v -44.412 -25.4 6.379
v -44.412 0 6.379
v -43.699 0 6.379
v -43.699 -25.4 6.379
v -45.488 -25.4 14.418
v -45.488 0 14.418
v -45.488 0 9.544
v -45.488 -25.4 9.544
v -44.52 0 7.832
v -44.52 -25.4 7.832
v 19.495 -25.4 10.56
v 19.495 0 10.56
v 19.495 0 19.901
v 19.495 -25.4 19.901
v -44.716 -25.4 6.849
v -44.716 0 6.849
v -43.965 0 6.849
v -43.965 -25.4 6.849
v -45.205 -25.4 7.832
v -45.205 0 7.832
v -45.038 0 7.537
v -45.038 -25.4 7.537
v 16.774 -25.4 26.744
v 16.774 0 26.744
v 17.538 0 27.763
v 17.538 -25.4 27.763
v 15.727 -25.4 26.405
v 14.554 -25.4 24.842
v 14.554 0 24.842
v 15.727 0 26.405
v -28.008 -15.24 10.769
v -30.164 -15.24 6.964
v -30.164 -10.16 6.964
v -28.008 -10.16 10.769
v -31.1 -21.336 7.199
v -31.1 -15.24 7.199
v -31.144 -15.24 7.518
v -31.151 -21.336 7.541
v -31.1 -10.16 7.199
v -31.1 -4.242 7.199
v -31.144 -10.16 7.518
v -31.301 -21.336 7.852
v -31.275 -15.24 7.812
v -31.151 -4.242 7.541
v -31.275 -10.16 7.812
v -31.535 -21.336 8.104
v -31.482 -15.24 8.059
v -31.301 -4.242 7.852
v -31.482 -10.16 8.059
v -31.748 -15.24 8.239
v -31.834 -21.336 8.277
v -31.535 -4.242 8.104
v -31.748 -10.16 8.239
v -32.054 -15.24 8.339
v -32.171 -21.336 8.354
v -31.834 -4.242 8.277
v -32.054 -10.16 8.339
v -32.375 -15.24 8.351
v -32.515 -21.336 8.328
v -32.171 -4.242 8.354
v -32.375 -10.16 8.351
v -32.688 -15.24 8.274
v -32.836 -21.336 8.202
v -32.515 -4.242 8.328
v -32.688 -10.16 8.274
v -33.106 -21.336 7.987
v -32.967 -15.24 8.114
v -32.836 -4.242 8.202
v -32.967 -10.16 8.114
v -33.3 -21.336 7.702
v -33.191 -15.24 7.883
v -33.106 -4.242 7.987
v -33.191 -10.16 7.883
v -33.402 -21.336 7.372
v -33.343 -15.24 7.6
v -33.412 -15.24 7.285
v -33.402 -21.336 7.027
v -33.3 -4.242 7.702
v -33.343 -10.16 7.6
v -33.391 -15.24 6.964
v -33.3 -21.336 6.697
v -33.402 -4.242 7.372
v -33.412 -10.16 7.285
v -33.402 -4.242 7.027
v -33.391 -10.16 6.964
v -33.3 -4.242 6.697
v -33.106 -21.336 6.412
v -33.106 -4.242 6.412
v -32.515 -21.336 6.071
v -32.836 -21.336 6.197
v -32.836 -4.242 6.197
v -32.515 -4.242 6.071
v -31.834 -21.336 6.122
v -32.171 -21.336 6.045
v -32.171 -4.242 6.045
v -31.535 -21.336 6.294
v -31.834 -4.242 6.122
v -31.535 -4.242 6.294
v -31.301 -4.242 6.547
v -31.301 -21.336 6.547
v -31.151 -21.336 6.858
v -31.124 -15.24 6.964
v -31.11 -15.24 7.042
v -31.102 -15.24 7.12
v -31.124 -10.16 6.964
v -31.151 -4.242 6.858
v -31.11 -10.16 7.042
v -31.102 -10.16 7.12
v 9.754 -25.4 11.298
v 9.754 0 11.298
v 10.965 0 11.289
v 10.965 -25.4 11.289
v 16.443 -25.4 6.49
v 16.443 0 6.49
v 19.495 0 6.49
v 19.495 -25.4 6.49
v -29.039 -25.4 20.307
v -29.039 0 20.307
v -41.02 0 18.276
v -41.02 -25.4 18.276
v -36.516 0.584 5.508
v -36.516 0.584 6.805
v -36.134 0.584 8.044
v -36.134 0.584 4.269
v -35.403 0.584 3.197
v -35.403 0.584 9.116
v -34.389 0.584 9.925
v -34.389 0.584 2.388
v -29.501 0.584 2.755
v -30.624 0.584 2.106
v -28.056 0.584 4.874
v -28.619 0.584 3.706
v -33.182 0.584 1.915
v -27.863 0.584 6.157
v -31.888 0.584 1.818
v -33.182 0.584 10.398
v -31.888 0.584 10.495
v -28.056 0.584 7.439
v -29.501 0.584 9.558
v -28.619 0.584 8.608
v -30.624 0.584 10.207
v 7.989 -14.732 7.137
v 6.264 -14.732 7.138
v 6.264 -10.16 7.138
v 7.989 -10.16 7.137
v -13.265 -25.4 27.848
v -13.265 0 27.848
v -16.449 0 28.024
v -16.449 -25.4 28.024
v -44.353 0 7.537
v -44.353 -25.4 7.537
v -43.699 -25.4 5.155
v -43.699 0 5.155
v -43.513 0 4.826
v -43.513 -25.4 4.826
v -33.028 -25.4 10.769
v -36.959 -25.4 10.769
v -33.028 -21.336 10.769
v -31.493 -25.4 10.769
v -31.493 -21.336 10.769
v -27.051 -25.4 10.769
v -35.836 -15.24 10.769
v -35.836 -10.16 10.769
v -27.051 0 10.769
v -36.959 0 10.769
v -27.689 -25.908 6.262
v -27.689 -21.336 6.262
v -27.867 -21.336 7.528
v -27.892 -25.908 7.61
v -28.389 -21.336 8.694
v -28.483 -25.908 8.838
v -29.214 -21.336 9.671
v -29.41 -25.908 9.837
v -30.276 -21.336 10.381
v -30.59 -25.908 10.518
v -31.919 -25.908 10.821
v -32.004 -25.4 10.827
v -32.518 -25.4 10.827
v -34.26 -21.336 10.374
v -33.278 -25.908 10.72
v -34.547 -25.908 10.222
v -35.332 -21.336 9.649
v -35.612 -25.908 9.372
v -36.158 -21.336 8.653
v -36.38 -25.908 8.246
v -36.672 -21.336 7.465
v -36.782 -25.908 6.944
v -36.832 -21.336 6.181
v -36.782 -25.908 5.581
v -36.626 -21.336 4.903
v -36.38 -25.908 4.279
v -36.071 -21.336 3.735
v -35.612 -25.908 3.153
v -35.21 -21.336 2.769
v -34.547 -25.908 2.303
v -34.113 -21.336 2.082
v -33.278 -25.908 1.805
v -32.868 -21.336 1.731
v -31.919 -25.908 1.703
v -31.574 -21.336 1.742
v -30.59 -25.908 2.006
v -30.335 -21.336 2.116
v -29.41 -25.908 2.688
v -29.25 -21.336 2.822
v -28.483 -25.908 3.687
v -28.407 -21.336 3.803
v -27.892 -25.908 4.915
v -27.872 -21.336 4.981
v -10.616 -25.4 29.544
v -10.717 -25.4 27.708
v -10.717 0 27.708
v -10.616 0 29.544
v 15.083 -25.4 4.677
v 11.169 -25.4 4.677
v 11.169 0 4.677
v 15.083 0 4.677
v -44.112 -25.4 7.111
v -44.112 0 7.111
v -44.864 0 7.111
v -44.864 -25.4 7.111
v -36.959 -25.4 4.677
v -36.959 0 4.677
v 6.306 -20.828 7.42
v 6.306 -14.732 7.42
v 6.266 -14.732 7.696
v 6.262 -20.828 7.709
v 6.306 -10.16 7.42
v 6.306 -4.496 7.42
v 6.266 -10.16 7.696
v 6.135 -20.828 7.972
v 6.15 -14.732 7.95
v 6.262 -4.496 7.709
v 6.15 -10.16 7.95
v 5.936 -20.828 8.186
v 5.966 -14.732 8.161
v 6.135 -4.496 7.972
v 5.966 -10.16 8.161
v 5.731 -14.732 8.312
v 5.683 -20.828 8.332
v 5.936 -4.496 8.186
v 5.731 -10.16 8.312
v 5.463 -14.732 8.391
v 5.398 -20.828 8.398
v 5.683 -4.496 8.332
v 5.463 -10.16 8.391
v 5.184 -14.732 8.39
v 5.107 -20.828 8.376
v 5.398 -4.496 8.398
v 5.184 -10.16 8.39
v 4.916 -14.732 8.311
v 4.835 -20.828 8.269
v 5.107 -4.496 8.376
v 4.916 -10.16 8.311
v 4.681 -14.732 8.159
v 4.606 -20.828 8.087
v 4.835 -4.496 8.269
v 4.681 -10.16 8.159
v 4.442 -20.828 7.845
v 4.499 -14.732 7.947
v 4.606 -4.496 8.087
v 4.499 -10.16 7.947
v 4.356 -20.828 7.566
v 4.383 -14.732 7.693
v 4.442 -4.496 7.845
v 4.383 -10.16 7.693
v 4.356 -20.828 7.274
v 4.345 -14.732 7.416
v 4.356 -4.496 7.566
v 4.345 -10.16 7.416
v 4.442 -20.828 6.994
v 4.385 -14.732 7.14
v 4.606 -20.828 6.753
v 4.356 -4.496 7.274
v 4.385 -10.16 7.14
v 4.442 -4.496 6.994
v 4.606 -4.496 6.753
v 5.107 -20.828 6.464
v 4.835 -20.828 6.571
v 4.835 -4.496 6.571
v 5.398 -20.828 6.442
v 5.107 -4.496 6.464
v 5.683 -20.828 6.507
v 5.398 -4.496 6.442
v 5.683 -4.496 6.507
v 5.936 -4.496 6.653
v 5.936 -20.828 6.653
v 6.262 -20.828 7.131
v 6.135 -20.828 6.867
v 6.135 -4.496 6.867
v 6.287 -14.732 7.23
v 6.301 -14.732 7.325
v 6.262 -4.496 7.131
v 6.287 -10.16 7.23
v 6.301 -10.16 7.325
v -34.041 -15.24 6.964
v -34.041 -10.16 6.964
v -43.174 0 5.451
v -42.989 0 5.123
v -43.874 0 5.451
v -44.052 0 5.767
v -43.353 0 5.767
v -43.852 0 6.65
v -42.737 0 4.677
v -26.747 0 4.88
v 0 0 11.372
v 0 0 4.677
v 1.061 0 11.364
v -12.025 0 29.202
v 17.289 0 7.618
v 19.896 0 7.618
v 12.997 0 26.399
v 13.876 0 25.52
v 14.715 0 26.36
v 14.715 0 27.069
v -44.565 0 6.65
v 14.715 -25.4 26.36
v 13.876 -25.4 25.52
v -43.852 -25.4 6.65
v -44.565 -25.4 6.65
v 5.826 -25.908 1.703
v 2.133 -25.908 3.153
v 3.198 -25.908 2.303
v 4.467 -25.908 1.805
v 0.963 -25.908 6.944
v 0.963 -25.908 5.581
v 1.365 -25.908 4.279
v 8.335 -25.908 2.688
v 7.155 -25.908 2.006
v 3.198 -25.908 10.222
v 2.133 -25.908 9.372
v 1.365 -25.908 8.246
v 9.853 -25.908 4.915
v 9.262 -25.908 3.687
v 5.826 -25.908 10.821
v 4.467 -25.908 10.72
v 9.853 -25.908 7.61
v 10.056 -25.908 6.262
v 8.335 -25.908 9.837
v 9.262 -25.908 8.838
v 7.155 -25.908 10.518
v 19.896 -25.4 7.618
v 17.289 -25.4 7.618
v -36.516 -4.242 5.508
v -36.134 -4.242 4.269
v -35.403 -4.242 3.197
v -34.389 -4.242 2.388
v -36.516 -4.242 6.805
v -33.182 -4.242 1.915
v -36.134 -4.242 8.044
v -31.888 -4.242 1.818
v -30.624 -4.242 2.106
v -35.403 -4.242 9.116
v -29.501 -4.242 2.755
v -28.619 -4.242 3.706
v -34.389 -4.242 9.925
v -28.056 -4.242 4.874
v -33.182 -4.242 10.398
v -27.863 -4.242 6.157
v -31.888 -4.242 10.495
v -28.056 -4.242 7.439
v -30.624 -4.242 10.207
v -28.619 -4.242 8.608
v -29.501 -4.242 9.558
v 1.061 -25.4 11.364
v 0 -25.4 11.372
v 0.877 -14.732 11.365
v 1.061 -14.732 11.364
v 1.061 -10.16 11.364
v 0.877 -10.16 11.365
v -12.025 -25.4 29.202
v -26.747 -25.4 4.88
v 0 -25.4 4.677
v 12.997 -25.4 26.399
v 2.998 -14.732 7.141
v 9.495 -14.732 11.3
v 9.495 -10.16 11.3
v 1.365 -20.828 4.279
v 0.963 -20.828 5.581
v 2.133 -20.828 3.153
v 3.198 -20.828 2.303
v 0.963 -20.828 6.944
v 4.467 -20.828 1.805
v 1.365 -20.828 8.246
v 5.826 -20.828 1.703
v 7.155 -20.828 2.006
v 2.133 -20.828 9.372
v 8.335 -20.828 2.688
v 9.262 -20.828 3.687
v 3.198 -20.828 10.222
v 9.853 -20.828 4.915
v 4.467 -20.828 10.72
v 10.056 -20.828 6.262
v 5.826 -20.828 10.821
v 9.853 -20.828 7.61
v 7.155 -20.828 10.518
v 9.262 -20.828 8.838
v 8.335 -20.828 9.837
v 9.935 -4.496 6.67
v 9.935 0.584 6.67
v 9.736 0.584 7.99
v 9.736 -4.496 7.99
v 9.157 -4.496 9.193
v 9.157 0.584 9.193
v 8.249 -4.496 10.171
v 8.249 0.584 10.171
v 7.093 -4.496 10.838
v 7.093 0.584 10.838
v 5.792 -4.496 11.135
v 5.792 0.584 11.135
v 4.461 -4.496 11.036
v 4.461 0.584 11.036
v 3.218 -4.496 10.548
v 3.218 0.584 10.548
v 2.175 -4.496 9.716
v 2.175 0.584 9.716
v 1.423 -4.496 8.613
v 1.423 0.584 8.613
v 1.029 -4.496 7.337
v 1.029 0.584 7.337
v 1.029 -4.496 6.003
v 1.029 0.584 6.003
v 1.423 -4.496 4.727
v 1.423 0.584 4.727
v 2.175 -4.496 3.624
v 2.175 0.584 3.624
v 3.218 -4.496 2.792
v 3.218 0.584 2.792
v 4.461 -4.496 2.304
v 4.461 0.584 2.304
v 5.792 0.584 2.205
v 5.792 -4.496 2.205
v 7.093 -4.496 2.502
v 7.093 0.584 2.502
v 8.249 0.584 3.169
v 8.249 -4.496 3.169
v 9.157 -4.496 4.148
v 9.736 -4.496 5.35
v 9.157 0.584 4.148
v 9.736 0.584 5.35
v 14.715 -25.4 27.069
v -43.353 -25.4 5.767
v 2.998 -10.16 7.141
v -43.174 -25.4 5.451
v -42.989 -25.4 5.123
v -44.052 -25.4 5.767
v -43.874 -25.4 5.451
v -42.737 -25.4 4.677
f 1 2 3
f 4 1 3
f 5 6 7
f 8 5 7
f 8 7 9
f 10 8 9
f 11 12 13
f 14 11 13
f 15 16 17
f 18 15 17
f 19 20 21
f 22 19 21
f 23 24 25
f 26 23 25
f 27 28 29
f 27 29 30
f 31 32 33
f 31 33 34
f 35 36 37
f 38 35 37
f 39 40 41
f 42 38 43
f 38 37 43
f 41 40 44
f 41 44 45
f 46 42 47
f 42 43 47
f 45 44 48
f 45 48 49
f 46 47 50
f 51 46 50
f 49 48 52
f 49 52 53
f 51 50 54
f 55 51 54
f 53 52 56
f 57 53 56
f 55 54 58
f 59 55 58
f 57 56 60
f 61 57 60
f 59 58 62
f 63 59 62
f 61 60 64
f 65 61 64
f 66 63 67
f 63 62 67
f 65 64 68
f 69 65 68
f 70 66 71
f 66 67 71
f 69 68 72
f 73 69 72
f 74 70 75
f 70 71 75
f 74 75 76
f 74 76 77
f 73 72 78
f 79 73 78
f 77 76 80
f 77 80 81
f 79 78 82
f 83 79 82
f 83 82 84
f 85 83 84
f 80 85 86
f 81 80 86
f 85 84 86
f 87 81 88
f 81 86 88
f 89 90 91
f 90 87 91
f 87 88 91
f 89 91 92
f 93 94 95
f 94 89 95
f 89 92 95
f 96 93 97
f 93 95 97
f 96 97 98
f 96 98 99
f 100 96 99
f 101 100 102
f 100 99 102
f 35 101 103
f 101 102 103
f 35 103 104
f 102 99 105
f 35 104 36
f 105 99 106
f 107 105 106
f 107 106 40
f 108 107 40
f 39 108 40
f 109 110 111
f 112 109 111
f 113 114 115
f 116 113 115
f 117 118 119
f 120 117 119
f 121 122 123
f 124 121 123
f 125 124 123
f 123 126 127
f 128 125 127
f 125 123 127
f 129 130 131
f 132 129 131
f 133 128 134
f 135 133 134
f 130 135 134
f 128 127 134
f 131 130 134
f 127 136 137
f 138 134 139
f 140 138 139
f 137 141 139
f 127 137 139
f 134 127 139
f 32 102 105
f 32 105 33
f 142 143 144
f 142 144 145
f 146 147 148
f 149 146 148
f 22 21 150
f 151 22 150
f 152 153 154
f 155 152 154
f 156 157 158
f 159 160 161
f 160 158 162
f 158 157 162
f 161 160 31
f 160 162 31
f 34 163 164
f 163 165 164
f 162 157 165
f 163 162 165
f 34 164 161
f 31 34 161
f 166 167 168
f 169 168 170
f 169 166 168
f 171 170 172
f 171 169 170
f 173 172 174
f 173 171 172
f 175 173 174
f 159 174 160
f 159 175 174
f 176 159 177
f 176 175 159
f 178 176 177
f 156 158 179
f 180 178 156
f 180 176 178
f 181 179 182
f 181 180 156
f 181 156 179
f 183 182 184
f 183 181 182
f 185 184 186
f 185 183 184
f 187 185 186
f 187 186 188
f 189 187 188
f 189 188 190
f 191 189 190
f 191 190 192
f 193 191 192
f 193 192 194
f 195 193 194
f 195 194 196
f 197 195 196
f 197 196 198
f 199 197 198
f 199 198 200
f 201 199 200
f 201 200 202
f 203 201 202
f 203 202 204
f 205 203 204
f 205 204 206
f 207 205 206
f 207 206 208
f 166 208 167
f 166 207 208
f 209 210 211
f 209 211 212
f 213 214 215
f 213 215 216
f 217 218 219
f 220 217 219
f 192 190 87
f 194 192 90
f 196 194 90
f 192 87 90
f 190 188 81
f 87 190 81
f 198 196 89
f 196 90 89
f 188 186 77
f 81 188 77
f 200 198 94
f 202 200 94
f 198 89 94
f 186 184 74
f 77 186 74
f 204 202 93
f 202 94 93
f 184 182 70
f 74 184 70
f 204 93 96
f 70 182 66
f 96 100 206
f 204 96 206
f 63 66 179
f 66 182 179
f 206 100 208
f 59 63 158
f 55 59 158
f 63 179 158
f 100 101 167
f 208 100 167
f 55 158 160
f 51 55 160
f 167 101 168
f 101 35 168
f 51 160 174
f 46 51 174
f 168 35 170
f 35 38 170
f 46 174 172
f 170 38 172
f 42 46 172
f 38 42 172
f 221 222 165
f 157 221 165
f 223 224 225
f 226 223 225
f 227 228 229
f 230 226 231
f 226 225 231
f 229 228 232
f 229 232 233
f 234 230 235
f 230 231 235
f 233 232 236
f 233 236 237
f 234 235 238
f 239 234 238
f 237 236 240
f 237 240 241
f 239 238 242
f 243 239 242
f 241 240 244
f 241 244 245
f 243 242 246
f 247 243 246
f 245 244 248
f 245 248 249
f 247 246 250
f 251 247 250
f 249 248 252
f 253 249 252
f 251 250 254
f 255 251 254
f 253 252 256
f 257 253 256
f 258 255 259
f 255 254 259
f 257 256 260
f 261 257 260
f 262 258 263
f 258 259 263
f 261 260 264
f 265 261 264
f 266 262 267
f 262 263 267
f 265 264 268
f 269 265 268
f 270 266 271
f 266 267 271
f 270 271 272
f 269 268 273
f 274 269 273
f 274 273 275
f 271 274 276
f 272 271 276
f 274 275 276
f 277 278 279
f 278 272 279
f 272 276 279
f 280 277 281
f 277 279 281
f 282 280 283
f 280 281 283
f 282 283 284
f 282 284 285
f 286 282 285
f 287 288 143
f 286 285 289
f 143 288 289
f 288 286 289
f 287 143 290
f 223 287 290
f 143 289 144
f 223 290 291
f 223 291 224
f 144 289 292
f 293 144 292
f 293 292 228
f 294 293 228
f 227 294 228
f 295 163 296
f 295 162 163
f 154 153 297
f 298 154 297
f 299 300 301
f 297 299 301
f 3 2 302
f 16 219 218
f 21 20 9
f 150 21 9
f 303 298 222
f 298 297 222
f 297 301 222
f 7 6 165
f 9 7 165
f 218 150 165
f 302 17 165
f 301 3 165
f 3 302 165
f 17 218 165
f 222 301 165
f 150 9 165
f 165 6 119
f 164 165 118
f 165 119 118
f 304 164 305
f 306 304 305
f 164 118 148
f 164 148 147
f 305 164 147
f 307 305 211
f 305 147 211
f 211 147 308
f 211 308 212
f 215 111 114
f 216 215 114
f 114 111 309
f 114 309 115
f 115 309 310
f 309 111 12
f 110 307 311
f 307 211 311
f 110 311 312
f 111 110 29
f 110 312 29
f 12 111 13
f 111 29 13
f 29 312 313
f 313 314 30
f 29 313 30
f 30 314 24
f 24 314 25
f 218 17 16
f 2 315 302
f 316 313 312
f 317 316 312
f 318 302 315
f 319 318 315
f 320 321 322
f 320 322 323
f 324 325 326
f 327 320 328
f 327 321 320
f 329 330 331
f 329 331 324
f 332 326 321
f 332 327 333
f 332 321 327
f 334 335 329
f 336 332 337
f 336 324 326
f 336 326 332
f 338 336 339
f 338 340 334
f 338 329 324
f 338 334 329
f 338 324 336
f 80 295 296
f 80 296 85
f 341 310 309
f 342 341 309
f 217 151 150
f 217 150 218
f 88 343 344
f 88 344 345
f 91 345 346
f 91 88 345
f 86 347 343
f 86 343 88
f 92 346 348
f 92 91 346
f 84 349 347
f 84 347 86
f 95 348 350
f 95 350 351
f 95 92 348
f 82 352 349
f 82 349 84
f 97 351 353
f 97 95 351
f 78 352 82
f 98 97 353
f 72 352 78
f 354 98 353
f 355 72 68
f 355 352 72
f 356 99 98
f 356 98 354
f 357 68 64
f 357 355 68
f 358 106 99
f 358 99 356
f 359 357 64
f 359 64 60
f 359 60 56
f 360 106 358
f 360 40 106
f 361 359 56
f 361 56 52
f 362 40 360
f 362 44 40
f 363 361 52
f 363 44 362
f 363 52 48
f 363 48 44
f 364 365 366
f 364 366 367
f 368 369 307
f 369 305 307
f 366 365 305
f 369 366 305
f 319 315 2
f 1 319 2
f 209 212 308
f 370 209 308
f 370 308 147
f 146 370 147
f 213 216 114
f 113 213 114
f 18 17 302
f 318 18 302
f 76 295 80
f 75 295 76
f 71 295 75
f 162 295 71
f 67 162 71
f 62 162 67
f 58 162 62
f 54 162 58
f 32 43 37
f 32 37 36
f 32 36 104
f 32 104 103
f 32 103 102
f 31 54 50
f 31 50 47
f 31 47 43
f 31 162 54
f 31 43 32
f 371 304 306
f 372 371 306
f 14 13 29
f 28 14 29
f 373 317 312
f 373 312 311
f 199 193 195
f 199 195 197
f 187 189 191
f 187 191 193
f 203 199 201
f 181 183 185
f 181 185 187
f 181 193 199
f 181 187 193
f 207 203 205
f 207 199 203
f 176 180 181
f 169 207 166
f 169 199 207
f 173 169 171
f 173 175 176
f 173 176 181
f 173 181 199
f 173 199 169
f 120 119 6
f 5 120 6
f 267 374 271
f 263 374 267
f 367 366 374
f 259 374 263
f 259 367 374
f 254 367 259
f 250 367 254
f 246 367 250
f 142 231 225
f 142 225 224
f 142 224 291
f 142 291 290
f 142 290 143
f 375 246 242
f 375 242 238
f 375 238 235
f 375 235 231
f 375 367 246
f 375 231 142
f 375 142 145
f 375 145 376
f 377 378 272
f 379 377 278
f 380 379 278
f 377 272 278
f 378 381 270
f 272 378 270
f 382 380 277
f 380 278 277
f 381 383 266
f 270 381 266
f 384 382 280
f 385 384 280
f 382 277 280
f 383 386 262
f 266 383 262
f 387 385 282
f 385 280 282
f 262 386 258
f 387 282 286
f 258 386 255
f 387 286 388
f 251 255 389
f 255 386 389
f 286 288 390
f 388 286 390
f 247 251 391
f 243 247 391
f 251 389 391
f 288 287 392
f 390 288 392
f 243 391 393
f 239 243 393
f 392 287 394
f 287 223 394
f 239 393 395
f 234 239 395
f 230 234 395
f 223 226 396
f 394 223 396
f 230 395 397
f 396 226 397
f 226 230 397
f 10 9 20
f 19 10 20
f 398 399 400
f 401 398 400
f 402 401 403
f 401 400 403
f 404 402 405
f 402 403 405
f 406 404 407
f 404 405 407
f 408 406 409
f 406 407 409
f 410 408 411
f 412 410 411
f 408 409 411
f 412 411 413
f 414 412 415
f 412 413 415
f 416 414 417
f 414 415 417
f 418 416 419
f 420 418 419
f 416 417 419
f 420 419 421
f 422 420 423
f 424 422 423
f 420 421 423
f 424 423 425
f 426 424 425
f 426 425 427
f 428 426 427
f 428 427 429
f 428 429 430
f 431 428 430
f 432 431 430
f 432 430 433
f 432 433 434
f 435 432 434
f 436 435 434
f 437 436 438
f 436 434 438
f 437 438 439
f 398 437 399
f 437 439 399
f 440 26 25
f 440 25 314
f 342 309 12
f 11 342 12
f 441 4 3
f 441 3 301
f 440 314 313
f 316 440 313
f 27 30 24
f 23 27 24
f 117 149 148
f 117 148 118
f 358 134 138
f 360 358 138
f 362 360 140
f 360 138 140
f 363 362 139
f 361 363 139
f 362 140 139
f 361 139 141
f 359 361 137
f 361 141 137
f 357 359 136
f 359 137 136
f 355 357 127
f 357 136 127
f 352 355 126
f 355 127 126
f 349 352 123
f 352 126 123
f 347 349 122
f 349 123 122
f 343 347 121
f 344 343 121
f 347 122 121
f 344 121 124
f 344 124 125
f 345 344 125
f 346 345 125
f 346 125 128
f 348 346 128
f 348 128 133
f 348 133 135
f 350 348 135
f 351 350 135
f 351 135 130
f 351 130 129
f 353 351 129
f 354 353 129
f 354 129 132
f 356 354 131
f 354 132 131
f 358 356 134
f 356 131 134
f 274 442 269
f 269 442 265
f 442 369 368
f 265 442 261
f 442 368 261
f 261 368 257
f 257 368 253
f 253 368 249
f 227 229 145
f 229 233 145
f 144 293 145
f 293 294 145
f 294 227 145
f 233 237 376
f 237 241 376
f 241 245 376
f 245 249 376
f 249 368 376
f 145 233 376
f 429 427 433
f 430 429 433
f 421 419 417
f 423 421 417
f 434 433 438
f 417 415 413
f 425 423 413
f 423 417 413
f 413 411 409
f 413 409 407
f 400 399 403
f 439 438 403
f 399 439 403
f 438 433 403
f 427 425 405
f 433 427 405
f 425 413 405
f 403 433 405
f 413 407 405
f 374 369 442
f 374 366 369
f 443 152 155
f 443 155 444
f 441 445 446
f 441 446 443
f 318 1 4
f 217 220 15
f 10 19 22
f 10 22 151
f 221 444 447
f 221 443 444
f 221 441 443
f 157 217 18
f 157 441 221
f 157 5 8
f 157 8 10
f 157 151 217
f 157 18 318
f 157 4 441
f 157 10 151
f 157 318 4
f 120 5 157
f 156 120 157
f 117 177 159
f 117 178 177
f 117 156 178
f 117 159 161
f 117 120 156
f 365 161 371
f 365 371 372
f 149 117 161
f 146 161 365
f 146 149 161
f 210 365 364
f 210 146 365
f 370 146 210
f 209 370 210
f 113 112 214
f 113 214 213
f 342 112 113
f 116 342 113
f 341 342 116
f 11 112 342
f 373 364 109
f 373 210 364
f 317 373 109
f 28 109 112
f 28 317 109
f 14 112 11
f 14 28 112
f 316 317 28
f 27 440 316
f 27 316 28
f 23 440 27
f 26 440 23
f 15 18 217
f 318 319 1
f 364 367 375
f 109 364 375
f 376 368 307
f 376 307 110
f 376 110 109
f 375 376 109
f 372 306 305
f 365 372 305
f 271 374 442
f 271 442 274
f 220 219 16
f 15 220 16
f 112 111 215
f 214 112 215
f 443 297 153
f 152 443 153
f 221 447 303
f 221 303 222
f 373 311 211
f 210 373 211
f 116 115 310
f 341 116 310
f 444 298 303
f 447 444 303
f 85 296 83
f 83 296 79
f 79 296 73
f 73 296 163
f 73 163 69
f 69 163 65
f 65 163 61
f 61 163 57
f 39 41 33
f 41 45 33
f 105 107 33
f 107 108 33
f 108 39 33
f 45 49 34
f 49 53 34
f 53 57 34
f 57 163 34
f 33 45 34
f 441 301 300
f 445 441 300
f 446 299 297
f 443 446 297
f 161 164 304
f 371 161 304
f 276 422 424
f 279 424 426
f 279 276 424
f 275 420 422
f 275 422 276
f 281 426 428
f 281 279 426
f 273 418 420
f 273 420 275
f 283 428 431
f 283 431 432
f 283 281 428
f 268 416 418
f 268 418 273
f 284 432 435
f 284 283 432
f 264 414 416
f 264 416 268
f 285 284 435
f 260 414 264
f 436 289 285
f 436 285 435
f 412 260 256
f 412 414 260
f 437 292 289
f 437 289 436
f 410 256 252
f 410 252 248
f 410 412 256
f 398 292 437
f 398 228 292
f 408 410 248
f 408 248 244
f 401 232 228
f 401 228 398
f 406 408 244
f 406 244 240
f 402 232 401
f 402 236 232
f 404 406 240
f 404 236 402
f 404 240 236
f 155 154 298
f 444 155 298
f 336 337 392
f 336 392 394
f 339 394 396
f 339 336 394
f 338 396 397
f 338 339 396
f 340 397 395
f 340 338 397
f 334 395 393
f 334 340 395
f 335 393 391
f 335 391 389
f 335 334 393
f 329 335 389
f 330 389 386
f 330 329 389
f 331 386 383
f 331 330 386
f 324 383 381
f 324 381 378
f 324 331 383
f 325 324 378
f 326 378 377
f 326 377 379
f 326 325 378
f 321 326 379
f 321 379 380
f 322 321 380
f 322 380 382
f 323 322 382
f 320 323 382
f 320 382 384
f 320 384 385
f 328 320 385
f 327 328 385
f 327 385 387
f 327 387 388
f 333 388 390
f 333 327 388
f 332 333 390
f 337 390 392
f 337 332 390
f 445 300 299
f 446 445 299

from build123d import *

# Parameters (mm, degrees)
F1_DEPTH       = 25.4
F4_DEPTH       = 2.54
F4_DEPTH_BACK  = 2.54
F7_DEPTH       = 2.032
F7_DEPTH_BACK  = 2.54
F8_R           = 1.1576826641
F9_DEPTH       = 12.7
F9_DEPTH_BACK  = 12.7
F10_R          = 0.9804880259
F11_DEPTH      = 12.7
F11_DEPTH_BACK = 12.7
F13_R          = 4.572
F14_DEPTH      = 4.572
F15_R          = 4.572
F16_DEPTH      = 5.08
F18_R          = 4.4779357242
F19_DEPTH      = 5.08
F20_R          = 4.3509487434
F21_DEPTH      = 4.826
F22_DEPTH      = 25.4
F23_DEPTH      = 25.4


with BuildPart() as f1:
    # F0 (on Front) → F1 (new body)
    with BuildSketch(Plane.XZ):
        Polygon((-42.7369444011, 4.6772318892), (-36.9589328766, 4.6772318892), (-36.9589328766, 10.7693634927), (-27.0514115691, 10.7693634927), (-26.7468057573, 4.8803025857), (0, 4.6772318892), (0, 11.3719804212), (1.0606472588, 11.3639276325), (9.7543726708, 11.297921961), (10.9652050924, 11.2887289162), (11.1689083278, 4.6772318892), (15.0829743681, 4.6772318892), (16.4426990051, 6.4901970327), (17.2888992398, 7.6184633654), (19.4948241115, 10.5596948415), (19.4948241115, 19.900964573), (14.554232661, 24.8415538992), (13.8758348479, 25.5199514207), (12.9965478554, 26.3992380351), (-10.717479028, 27.7076002598), (-13.2646739035, 27.8481353773), (-16.4487566799, 28.0238091946), (-29.0391631424, 20.3071068972), (-41.0203561187, 18.2763971388), (-45.4879179597, 14.4180459902), (-45.4879179597, 9.5443399623), (-44.5200988283, 7.8320442214), (-44.3530531096, 7.5365017348), (-44.1124311804, 7.1107859258), (-43.9645371878, 6.8491272694), (-43.8518225557, 6.6497090328), (-43.6986885549, 6.3787795906), (-43.3529015226, 5.7670024068), (-43.17437928, 5.4511552968), (-42.9887916429, 5.122807871), align=None)
        Polygon((-43.5131009178, 4.8264592117), (-42.9887916429, 5.122807871), (-43.17437928, 5.4511552968), (-43.6986885549, 5.1548066375), align=None)
        Polygon((-43.8739407822, 5.4511552968), (-43.17437928, 5.4511552968), (-43.3529015226, 5.7670024068), (-44.0524630249, 5.7670024068), align=None)
        Polygon((-44.4116123194, 6.3787795906), (-43.6986885549, 6.3787795906), (-43.8518225557, 6.6497090328), (-44.5647463202, 6.6497090328), align=None)
        Polygon((-44.7156839396, 6.8491272694), (-43.9645371878, 6.8491272694), (-44.1124311804, 7.1107859258), (-44.8635779321, 7.1107859258), align=None)
        Polygon((-45.0380556521, 7.5365017348), (-44.3530531096, 7.5365017348), (-44.5200988283, 7.8320442214), (-45.2051013708, 7.8320442214), align=None)
        Polygon((17.2888992398, 7.6184633654), (16.4426990051, 6.4901970327), (19.4948241115, 6.4901970327), (19.8960918933, 7.6184633654), align=None)
        Polygon((13.8758348479, 25.5199514207), (14.554232661, 24.8415538992), (15.7266985625, 26.4048408717), (16.7735743968, 26.7441401112), (17.537901178, 27.763241902), (14.7154445676, 27.0689483732), (14.7154445676, 26.3595615014), align=None)
        Polygon((-12.0249697939, 29.2020086199), (-13.2646739035, 27.8481353773), (-10.717479028, 27.7076002598), (-10.6161860749, 29.5435320586), align=None)
    extrude(amount=F1_DEPTH)

    # F3 (on offset) → F4 (join, two sides)
    with BuildSketch(Plane.XZ.offset(12.7)) as f4_sk:
        Polygon((-28.008485968, 10.7693634927), (-35.8356192608, 10.7693634927), (-34.0407073398, 6.9641508162), (-30.1636971433, 6.9641508162), align=None)
    extrude(amount=F4_DEPTH)
    extrude(f4_sk.sketch, amount=-F4_DEPTH_BACK)

    # F6 (on offset) → F7 (join, two sides)
    with BuildSketch(Plane.XZ.offset(12.7)) as f7_sk:
        Polygon((9.4945231002, 11.2998948258), (0.8765038544, 11.3653257108), (2.9983955901, 7.1409773082), (7.989410311, 7.1365474723), align=None)
    extrude(amount=F7_DEPTH)
    extrude(f7_sk.sketch, amount=-F7_DEPTH_BACK)

    # F8 (on offset) → F9 (join, two sides)
    with BuildSketch(Plane.XZ.offset(12.7)) as f9_sk:
        with Locations((-32.2571918368, 7.1993744932)):
            Circle(F8_R)
    extrude(amount=F9_DEPTH)
    extrude(f9_sk.sketch, amount=-F9_DEPTH_BACK)

    # F10 (on offset) → F11 (join, two sides)
    with BuildSketch(Plane.XZ.offset(12.7)) as f11_sk:
        with Locations((5.3251022473, 7.4197696522)):
            Circle(F10_R)
    extrude(amount=F11_DEPTH)
    extrude(f11_sk.sketch, amount=-F11_DEPTH_BACK)

    # F13 (on offset) → F14 (join)
    with BuildSketch(Plane.XZ.offset(25.908)):
        with Locations((-32.2608351707, 6.2622600235)):
            Circle(F13_R)
    extrude(amount=-F14_DEPTH)

    # F15 (on offset) → F16 (join)
    with BuildSketch(Plane.XZ.offset(25.908)):
        with Locations((5.4841622319, 6.2622600235)):
            Circle(F15_R)
    extrude(amount=-F16_DEPTH)

    # F18 (on offset) → F19 (join)
    with BuildSketch(Plane.XZ.offset(-0.5842)):
        with Locations((5.4573472589, 6.6700675525)):
            Circle(F18_R)
    extrude(amount=F19_DEPTH)

    # F20 (on offset) → F21 (join)
    with BuildSketch(Plane.XZ.offset(-0.5842)):
        with Locations((-32.2135724127, 6.1565306969)):
            Circle(F20_R)
    extrude(amount=F21_DEPTH)

    # F0 (on Front) → F22 (join)
    with BuildSketch(Plane.XZ):
        Polygon((-42.7369444011, 4.6772318892), (-36.9589328766, 4.6772318892), (-36.9589328766, 10.7693634927), (-27.0514115691, 10.7693634927), (-26.7468057573, 4.8803025857), (0, 4.6772318892), (0, 11.3719804212), (1.0606472588, 11.3639276325), (9.7543726708, 11.297921961), (10.9652050924, 11.2887289162), (11.1689083278, 4.6772318892), (15.0829743681, 4.6772318892), (16.4426990051, 6.4901970327), (17.2888992398, 7.6184633654), (19.4948241115, 10.5596948415), (19.4948241115, 19.900964573), (14.554232661, 24.8415538992), (13.8758348479, 25.5199514207), (12.9965478554, 26.3992380351), (-10.717479028, 27.7076002598), (-13.2646739035, 27.8481353773), (-16.4487566799, 28.0238091946), (-29.0391631424, 20.3071068972), (-41.0203561187, 18.2763971388), (-45.4879179597, 14.4180459902), (-45.4879179597, 9.5443399623), (-44.5200988283, 7.8320442214), (-44.3530531096, 7.5365017348), (-44.1124311804, 7.1107859258), (-43.9645371878, 6.8491272694), (-43.8518225557, 6.6497090328), (-43.6986885549, 6.3787795906), (-43.3529015226, 5.7670024068), (-43.17437928, 5.4511552968), (-42.9887916429, 5.122807871), align=None)
        Polygon((-43.5131009178, 4.8264592117), (-42.9887916429, 5.122807871), (-43.17437928, 5.4511552968), (-43.6986885549, 5.1548066375), align=None)
        Polygon((-43.8739407822, 5.4511552968), (-43.17437928, 5.4511552968), (-43.3529015226, 5.7670024068), (-44.0524630249, 5.7670024068), align=None)
        Polygon((-44.4116123194, 6.3787795906), (-43.6986885549, 6.3787795906), (-43.8518225557, 6.6497090328), (-44.5647463202, 6.6497090328), align=None)
        Polygon((-44.7156839396, 6.8491272694), (-43.9645371878, 6.8491272694), (-44.1124311804, 7.1107859258), (-44.8635779321, 7.1107859258), align=None)
        Polygon((-45.0380556521, 7.5365017348), (-44.3530531096, 7.5365017348), (-44.5200988283, 7.8320442214), (-45.2051013708, 7.8320442214), align=None)
        Polygon((17.2888992398, 7.6184633654), (16.4426990051, 6.4901970327), (19.4948241115, 6.4901970327), (19.8960918933, 7.6184633654), align=None)
        Polygon((13.8758348479, 25.5199514207), (14.554232661, 24.8415538992), (15.7266985625, 26.4048408717), (16.7735743968, 26.7441401112), (17.537901178, 27.763241902), (14.7154445676, 27.0689483732), (14.7154445676, 26.3595615014), align=None)
        Polygon((-12.0249697939, 29.2020086199), (-13.2646739035, 27.8481353773), (-10.717479028, 27.7076002598), (-10.6161860749, 29.5435320586), align=None)
    extrude(amount=F22_DEPTH)

    # F0 (on Front) → F23 (join)
    with BuildSketch(Plane.XZ):
        Polygon((-42.7369444011, 4.6772318892), (-36.9589328766, 4.6772318892), (-36.9589328766, 10.7693634927), (-27.0514115691, 10.7693634927), (-26.7468057573, 4.8803025857), (0, 4.6772318892), (0, 11.3719804212), (1.0606472588, 11.3639276325), (9.7543726708, 11.297921961), (10.9652050924, 11.2887289162), (11.1689083278, 4.6772318892), (15.0829743681, 4.6772318892), (16.4426990051, 6.4901970327), (17.2888992398, 7.6184633654), (19.4948241115, 10.5596948415), (19.4948241115, 19.900964573), (14.554232661, 24.8415538992), (13.8758348479, 25.5199514207), (12.9965478554, 26.3992380351), (-10.717479028, 27.7076002598), (-13.2646739035, 27.8481353773), (-16.4487566799, 28.0238091946), (-29.0391631424, 20.3071068972), (-41.0203561187, 18.2763971388), (-45.4879179597, 14.4180459902), (-45.4879179597, 9.5443399623), (-44.5200988283, 7.8320442214), (-44.3530531096, 7.5365017348), (-44.1124311804, 7.1107859258), (-43.9645371878, 6.8491272694), (-43.8518225557, 6.6497090328), (-43.6986885549, 6.3787795906), (-43.3529015226, 5.7670024068), (-43.17437928, 5.4511552968), (-42.9887916429, 5.122807871), align=None)
        Polygon((-43.5131009178, 4.8264592117), (-42.9887916429, 5.122807871), (-43.17437928, 5.4511552968), (-43.6986885549, 5.1548066375), align=None)
        Polygon((-43.8739407822, 5.4511552968), (-43.17437928, 5.4511552968), (-43.3529015226, 5.7670024068), (-44.0524630249, 5.7670024068), align=None)
        Polygon((-44.4116123194, 6.3787795906), (-43.6986885549, 6.3787795906), (-43.8518225557, 6.6497090328), (-44.5647463202, 6.6497090328), align=None)
        Polygon((-44.7156839396, 6.8491272694), (-43.9645371878, 6.8491272694), (-44.1124311804, 7.1107859258), (-44.8635779321, 7.1107859258), align=None)
        Polygon((-45.0380556521, 7.5365017348), (-44.3530531096, 7.5365017348), (-44.5200988283, 7.8320442214), (-45.2051013708, 7.8320442214), align=None)
        Polygon((17.2888992398, 7.6184633654), (16.4426990051, 6.4901970327), (19.4948241115, 6.4901970327), (19.8960918933, 7.6184633654), align=None)
        Polygon((13.8758348479, 25.5199514207), (14.554232661, 24.8415538992), (15.7266985625, 26.4048408717), (16.7735743968, 26.7441401112), (17.537901178, 27.763241902), (14.7154445676, 27.0689483732), (14.7154445676, 26.3595615014), align=None)
        Polygon((-12.0249697939, 29.2020086199), (-13.2646739035, 27.8481353773), (-10.717479028, 27.7076002598), (-10.6161860749, 29.5435320586), align=None)
    extrude(amount=F23_DEPTH)


solid = f1.part
